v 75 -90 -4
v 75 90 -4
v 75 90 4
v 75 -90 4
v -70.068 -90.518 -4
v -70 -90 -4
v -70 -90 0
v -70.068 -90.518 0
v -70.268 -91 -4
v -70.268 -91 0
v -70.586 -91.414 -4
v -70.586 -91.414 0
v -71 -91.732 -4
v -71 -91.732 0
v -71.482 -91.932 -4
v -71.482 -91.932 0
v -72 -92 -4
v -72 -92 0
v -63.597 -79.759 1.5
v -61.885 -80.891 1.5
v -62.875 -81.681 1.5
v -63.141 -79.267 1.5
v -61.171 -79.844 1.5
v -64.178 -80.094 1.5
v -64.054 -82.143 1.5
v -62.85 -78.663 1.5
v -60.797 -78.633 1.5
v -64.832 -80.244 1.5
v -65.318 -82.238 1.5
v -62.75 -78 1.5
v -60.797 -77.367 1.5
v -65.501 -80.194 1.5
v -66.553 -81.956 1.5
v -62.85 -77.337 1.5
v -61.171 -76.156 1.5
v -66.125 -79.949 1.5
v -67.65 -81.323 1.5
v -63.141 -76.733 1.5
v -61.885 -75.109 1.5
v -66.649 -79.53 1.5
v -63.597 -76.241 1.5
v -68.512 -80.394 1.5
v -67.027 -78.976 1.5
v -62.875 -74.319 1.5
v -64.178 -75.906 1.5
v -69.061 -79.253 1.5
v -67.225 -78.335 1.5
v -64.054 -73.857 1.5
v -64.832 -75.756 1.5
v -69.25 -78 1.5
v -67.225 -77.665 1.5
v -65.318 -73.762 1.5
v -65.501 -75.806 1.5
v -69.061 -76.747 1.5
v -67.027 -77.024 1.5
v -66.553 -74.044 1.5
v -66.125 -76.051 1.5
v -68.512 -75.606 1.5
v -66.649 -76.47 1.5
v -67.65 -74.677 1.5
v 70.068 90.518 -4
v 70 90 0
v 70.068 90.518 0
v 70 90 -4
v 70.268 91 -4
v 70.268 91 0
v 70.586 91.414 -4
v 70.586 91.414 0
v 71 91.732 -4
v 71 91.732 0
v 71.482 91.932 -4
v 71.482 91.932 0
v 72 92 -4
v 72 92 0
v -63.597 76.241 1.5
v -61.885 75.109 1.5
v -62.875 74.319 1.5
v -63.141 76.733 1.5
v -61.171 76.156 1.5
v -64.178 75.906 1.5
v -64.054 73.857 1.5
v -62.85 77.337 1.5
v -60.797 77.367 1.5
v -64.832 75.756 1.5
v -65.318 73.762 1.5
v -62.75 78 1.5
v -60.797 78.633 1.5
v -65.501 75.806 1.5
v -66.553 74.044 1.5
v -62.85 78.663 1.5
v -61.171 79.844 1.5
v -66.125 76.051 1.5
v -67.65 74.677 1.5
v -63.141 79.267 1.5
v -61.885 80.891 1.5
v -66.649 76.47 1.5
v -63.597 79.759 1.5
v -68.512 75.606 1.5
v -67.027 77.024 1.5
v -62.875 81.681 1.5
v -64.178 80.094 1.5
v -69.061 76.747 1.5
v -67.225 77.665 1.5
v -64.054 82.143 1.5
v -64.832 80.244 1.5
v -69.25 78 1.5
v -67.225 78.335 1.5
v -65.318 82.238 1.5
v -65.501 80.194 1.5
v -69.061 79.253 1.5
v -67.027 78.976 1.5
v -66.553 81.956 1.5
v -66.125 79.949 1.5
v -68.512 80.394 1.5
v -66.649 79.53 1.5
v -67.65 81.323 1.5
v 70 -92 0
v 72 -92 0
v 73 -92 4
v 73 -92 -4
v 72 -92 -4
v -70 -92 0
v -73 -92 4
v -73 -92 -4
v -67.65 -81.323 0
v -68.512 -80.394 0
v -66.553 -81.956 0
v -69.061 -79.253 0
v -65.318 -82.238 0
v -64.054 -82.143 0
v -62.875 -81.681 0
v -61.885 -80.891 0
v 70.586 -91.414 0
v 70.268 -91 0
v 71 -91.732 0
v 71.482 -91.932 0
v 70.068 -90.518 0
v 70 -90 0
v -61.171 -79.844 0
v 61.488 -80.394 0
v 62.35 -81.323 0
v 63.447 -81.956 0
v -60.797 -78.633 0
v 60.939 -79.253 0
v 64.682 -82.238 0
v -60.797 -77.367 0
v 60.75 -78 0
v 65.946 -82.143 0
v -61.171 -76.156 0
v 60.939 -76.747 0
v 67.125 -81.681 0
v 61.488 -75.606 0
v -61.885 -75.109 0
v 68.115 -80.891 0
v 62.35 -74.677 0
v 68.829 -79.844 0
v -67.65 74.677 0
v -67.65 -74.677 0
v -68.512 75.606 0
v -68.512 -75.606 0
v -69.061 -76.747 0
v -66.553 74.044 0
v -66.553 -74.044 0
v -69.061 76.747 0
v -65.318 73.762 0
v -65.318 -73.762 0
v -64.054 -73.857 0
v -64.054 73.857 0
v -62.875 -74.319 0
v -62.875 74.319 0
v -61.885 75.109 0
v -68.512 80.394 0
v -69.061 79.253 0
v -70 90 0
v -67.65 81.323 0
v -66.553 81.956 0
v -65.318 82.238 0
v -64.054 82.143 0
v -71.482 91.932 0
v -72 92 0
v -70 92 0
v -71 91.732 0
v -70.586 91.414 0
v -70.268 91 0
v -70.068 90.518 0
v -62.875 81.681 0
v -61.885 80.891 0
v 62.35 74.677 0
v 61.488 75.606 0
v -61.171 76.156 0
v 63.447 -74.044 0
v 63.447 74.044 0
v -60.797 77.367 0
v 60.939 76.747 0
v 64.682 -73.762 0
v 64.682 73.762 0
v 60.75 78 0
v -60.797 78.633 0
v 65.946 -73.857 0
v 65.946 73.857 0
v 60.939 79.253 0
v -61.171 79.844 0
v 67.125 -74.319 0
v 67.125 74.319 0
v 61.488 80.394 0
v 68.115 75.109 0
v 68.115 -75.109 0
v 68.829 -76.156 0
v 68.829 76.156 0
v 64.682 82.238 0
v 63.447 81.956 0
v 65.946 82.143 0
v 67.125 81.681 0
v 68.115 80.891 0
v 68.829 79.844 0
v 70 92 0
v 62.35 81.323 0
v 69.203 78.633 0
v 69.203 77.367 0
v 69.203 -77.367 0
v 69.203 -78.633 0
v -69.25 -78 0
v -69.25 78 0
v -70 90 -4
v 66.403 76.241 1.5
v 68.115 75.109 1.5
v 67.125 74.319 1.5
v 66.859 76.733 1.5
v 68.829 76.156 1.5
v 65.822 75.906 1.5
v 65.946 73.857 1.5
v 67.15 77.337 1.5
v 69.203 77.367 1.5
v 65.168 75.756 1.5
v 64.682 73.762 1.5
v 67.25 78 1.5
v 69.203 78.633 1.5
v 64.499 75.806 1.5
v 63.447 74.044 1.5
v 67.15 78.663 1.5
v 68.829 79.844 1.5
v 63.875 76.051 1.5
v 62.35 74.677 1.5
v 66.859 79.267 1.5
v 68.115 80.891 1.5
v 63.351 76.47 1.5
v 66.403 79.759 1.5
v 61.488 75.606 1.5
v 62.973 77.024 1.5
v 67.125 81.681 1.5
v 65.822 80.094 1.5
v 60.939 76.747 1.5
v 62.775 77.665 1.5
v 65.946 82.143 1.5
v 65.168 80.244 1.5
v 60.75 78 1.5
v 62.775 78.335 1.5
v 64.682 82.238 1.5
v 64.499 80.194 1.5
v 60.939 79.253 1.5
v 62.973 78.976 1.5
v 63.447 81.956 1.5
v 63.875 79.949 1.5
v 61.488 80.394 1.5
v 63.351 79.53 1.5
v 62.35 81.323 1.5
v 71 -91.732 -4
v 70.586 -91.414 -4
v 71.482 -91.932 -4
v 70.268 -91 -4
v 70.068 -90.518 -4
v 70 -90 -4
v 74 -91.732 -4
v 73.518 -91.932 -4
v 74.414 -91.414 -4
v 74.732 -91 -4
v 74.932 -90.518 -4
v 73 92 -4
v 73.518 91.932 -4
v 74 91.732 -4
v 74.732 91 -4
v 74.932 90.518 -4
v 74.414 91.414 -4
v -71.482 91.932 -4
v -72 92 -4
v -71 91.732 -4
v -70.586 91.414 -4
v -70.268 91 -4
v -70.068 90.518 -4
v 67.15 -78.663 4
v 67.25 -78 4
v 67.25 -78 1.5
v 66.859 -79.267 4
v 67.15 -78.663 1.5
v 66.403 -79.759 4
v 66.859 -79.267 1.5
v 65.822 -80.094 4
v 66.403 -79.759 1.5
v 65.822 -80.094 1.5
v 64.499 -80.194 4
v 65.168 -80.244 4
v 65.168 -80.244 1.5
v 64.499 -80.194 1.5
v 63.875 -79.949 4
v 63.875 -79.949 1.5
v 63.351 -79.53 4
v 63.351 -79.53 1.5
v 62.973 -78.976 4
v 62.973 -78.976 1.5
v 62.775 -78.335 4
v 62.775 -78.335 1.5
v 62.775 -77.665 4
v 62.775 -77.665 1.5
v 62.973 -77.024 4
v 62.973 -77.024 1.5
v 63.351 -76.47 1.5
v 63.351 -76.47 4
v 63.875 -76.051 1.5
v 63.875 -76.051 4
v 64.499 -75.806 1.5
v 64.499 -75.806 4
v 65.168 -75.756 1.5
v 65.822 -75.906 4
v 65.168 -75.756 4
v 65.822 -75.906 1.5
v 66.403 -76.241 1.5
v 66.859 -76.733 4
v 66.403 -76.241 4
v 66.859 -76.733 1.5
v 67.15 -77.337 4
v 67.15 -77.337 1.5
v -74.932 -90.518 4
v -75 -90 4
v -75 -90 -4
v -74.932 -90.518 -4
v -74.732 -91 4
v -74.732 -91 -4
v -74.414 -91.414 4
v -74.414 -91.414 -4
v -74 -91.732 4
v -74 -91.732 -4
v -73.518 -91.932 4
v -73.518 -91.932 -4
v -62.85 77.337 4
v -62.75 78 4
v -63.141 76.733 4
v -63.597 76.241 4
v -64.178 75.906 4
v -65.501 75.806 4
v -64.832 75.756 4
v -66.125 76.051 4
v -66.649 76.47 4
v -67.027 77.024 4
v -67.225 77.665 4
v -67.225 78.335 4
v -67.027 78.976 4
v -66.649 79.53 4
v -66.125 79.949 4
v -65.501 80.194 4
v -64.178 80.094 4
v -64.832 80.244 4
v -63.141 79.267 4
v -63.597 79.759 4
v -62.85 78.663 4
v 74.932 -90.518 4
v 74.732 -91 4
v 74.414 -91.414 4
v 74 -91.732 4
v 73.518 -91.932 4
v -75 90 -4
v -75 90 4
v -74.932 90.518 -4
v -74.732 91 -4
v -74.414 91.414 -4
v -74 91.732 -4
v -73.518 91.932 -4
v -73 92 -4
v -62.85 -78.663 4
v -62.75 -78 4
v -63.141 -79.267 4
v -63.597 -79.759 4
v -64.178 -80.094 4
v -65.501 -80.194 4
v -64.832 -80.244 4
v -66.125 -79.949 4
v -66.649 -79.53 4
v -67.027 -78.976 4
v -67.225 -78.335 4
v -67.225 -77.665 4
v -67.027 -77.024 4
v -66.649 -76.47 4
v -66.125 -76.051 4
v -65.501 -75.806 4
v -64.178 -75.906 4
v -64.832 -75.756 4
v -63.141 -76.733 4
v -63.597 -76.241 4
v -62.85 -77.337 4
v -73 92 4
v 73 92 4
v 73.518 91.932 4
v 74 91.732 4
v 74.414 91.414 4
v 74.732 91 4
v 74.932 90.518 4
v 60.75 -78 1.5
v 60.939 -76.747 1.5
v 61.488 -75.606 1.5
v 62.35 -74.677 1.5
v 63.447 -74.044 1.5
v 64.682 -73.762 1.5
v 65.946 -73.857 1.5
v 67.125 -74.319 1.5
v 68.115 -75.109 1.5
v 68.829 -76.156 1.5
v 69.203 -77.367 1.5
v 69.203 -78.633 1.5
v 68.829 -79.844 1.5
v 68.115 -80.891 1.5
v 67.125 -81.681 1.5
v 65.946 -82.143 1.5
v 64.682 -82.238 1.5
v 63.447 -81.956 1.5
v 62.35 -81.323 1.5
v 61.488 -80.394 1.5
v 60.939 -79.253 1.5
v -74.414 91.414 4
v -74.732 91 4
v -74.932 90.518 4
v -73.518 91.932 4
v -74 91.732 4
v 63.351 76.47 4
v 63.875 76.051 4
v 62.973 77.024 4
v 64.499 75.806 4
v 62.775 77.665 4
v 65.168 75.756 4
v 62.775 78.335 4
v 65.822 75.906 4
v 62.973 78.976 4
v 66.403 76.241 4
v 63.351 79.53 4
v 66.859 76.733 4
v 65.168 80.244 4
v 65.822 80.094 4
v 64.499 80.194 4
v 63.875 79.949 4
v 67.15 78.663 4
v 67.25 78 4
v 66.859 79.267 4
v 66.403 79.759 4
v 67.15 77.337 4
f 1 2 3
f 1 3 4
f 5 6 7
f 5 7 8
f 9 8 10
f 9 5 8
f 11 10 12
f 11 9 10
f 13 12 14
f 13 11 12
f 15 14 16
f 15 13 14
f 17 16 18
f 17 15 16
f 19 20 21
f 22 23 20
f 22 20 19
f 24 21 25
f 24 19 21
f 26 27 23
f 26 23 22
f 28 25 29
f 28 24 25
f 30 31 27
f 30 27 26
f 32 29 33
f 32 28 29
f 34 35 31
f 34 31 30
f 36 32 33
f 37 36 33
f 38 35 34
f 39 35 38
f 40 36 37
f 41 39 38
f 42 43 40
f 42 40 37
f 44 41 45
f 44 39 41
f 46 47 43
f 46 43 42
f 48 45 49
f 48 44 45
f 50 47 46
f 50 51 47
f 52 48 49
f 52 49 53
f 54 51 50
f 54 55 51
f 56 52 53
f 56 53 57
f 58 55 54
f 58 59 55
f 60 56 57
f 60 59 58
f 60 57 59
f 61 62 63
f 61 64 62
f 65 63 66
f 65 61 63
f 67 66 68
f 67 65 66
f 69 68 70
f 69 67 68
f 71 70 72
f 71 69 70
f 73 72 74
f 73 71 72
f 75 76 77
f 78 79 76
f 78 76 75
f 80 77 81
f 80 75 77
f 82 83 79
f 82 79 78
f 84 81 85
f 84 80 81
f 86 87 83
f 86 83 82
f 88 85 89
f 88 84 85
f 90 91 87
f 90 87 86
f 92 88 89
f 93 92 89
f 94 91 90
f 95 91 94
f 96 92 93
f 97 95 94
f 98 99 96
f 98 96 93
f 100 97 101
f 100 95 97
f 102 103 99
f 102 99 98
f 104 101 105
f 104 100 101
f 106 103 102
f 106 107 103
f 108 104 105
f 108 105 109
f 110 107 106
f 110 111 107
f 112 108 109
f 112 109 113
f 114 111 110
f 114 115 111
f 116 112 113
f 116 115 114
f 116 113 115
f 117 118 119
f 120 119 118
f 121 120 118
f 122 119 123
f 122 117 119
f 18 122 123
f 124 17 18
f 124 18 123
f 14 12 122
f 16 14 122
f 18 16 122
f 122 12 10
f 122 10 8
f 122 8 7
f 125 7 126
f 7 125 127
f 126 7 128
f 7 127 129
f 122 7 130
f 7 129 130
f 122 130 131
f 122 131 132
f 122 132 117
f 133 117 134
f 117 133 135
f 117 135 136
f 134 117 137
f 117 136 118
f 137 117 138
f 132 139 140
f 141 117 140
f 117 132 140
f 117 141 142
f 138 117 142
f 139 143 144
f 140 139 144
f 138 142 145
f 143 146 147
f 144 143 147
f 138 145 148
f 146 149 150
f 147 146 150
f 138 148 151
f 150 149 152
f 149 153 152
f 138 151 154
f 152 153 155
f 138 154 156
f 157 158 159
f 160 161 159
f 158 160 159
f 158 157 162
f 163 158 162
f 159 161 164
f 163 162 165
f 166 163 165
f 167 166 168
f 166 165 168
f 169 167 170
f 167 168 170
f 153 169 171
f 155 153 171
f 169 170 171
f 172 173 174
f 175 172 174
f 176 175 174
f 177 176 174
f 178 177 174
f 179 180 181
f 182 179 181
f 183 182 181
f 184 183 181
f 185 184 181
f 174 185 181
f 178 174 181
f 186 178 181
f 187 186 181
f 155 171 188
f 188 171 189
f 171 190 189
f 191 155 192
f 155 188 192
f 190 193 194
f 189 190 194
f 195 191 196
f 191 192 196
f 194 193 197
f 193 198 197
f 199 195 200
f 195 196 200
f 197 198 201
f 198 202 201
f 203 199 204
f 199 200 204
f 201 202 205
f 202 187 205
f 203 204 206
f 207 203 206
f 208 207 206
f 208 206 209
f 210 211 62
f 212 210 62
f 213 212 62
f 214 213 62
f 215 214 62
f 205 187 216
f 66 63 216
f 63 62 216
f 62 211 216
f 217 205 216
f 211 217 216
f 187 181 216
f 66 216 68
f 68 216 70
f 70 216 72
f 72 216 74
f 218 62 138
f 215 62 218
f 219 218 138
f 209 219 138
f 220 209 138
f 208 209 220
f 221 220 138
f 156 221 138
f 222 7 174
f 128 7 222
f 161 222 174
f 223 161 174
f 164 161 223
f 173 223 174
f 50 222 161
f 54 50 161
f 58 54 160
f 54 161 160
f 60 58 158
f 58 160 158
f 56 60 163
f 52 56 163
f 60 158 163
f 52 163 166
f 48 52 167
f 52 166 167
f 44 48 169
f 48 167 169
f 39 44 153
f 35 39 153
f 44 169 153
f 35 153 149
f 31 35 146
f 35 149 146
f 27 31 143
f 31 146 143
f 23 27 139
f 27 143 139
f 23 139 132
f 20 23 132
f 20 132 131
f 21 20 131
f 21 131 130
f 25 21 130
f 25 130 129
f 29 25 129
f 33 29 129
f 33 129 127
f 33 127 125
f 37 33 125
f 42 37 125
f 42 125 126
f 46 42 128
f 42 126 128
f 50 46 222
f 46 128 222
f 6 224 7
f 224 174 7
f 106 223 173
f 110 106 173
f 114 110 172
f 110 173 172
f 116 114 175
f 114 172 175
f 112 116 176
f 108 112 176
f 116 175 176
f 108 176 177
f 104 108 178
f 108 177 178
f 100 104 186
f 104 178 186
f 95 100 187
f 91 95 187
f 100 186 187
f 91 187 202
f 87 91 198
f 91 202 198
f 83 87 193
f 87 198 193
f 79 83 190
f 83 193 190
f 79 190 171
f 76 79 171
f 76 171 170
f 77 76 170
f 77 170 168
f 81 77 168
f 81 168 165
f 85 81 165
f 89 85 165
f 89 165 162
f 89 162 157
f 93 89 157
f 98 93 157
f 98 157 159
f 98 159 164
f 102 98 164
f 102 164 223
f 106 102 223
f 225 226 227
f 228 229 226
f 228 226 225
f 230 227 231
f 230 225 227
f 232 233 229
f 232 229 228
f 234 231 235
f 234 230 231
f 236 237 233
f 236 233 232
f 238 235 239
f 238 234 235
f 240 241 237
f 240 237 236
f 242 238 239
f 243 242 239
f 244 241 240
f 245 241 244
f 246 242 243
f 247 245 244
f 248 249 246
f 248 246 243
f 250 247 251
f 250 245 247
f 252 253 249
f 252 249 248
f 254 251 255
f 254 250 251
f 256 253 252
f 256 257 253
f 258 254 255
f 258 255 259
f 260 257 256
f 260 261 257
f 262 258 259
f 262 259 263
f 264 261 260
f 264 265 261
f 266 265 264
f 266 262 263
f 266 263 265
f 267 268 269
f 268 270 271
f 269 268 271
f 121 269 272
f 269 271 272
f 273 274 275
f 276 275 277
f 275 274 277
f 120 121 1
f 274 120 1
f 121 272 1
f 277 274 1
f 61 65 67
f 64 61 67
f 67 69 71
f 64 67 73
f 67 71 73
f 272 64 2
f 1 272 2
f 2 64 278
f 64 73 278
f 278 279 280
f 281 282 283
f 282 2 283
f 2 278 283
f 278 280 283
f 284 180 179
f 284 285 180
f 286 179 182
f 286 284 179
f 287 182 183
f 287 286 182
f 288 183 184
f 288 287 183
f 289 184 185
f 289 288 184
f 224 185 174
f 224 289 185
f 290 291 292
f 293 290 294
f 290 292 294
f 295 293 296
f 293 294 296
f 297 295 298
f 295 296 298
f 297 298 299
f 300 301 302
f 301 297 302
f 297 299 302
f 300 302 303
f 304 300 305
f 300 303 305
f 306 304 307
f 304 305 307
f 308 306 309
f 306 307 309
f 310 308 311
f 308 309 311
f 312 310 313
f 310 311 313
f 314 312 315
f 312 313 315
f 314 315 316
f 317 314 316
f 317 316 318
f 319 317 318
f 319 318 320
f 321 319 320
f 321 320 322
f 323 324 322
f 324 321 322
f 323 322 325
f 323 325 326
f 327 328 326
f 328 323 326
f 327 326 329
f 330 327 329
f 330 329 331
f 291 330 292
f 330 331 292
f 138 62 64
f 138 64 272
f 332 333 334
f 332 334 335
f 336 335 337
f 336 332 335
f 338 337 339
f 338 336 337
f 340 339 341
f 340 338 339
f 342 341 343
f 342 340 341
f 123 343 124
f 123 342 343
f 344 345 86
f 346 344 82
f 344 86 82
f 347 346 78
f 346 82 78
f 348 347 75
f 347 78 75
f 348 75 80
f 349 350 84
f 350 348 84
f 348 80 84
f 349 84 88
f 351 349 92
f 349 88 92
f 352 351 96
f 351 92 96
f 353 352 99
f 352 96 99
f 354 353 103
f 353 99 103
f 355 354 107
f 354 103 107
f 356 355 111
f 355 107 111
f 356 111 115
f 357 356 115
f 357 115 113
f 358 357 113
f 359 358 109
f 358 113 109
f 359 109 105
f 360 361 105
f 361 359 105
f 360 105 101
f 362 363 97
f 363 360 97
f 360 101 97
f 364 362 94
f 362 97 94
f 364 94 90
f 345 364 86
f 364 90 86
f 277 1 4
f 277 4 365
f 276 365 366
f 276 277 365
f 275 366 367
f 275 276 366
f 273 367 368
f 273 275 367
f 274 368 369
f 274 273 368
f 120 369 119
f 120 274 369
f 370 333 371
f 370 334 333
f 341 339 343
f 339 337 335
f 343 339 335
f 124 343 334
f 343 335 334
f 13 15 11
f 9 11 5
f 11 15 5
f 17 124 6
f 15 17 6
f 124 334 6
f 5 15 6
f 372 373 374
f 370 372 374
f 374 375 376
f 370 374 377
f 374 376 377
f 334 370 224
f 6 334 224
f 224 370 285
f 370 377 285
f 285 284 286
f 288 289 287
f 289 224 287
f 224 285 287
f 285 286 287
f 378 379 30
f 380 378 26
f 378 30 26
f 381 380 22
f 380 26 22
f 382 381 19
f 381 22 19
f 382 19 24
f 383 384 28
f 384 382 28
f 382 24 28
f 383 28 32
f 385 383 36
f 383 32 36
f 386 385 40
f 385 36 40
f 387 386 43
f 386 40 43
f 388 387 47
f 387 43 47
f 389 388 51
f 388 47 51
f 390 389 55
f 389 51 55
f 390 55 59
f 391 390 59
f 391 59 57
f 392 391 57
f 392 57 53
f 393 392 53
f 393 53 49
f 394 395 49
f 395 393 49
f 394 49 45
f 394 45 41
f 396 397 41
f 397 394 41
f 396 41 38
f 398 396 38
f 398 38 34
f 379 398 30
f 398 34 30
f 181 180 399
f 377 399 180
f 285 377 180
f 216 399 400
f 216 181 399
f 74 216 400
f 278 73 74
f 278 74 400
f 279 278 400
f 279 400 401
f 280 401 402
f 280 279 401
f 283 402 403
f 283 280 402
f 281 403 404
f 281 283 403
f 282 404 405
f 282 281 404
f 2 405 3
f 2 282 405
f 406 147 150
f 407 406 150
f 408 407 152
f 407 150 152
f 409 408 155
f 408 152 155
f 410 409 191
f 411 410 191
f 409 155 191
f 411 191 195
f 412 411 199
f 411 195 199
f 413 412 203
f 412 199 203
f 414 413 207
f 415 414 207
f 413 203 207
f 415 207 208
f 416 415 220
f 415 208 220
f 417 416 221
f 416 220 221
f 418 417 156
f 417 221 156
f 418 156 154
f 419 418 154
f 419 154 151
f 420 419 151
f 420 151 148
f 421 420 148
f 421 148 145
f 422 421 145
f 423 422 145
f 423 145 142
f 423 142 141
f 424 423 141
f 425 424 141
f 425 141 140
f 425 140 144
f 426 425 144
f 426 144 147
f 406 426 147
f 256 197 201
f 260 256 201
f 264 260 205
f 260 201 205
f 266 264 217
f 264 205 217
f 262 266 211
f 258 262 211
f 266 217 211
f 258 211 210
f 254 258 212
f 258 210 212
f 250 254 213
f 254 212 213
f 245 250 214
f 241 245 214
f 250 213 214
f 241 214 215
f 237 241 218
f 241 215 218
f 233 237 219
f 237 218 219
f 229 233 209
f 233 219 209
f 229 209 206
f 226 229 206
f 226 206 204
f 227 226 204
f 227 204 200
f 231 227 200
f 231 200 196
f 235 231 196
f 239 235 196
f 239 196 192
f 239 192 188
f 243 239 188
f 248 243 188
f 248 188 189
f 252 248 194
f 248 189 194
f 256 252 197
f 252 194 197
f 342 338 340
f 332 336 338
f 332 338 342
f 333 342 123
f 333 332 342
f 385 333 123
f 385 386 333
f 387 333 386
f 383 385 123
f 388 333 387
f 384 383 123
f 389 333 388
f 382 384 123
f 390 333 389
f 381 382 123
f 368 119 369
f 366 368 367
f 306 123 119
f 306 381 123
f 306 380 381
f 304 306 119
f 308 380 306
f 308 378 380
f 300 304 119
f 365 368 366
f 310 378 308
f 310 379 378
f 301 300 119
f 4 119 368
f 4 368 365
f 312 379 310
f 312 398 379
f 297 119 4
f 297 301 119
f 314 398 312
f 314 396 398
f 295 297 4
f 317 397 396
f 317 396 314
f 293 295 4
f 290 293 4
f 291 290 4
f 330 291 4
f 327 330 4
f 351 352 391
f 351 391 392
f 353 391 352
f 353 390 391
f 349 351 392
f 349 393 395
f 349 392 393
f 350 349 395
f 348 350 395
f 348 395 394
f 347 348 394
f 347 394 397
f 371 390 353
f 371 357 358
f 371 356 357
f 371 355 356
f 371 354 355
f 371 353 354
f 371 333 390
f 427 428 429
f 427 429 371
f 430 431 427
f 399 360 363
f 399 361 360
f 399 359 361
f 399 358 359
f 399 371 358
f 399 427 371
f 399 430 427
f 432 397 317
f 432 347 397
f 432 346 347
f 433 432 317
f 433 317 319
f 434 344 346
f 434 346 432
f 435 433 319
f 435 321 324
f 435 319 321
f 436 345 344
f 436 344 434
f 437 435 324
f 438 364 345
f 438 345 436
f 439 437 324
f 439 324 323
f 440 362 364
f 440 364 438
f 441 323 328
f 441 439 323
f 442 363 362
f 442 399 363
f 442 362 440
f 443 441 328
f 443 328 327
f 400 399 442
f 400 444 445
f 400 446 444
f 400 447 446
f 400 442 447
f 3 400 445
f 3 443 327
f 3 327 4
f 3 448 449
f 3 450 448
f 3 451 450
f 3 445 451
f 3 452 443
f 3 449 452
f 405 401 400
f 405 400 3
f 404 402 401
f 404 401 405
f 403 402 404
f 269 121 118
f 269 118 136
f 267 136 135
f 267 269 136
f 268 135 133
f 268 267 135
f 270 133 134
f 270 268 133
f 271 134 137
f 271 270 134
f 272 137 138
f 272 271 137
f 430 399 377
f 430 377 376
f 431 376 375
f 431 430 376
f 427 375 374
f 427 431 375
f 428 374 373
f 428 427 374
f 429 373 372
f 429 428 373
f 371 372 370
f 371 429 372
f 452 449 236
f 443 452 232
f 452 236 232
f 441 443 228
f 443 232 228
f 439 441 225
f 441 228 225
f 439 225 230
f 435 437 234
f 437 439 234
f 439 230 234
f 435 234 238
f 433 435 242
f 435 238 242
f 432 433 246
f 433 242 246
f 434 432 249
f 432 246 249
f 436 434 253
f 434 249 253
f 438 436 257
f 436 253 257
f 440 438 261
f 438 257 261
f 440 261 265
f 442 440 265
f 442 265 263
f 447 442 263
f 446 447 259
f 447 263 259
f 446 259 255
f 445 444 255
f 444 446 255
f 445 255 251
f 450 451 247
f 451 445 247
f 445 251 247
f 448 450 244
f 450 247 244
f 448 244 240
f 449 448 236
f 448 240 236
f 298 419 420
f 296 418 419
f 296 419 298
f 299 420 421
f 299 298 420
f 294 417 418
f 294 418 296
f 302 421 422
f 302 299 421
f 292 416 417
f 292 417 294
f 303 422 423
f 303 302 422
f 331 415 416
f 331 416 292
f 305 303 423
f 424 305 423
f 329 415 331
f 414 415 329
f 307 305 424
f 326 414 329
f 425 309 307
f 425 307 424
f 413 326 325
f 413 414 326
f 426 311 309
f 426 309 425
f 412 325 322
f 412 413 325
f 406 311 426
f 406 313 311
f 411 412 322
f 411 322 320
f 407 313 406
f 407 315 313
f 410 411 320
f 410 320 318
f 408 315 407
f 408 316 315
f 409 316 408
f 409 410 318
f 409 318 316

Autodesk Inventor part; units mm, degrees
ref_plane "YZ Plane" through (0, 0, 0) normal (1, 0, 0) x (0, 1, 0)
ref_plane "XZ Plane" through (0, 0, 0) normal (0, 1, 0) x (-1, 0, 0)
ref_plane "XY Plane" through (0, 0, 0) normal (0, 0, 1) x (1, 0, 0)
sketch "スケッチ1" plane through (0, 0, 0) normal (0, 0, 1) x (1, 0, 0)
  line L0 (-75, 92) -> (75, 92)
  line L1 (75, 92) -> (75, -92)
  line L2 (75, -92) -> (-75, -92)
  line L3 (-75, -92) -> (-75, 92)
  line L4 (65, 92) -> (65, -92) construction
  line L5 (-65, 92) -> (-65, -92) construction
  line L6 (-65, 0) -> (65, 0) construction
  circle A0 centre (-65, 78) radius 2.25
  circle A1 centre (65, 78) radius 2.25
  circle A2 centre (-65, -78) radius 2.25
  circle A3 centre (65, -78) radius 2.25
  point P0 (0, 0)
  point P1 (0, 92)
  point P2 (-75, 0)
  point P3 (0, 0)
  dimension "d0" = 184
  dimension "d1" = 150
  dimension "d2" = 130
  dimension "d3" = 78
  dimension "d4" = 78
  dimension "d5" = 4.5
extrude "押し出し1" add sketch "スケッチ1" along normal blind 4
sketch "スケッチ3" plane through (0, 0, 0) normal (0, 0, 1) x (1, 0, 0)
  line L0 (-75, -92) -> (75, -92) construction
  line L1 (-75, 92) -> (-75, -92) construction
  line L2 (75, 92) -> (-75, 92) construction
  line L3 (75, -92) -> (75, 92) construction
  circle A0 centre (65, -78) radius 2.25 construction
  circle A1 centre (-65, -78) radius 2.25 construction
  circle A2 centre (65, 78) radius 2.25 construction
  circle A3 centre (-65, 78) radius 2.25 construction
  line L4 (75, 92) -> (-75, 92) projected
  line L5 (-75, -92) -> (75, -92) projected
  line L6 (-75, 92) -> (-70, 92)
  line L7 (-70, 92) -> (-70, -92)
  line L8 (-70, -92) -> (-75, -92)
  line L9 (-75, -92) -> (-75, 92)
  line L10 (75, -92) -> (75, 92) projected
  line L11 (75, 92) -> (70, 92)
  line L12 (70, 92) -> (70, -92)
  line L13 (70, -92) -> (75, -92)
  line L14 (75, -92) -> (75, 92)
  point P0 (0, 0)
  point P1 (70, 92)
  point P2 (70, -92)
  dimension "d8" = 5
extrude "押し出し2" add sketch "スケッチ3" against normal blind 4 contours L10 L5 L12 L4 | L7 L5 L9 L4
sketch "スケッチ4" plane through (0, 0, 0) normal (0, 0, -1) x (-1, 0, 0)
  circle A0 centre (65, 78) radius 2.25 construction
  circle A1 centre (-65, 78) radius 2.25 construction
  circle A2 centre (-65, -78) radius 2.25 construction
  circle A3 centre (65, -78) radius 2.25 construction
  circle A4 centre (65, 78) radius 2.25 projected
  circle A5 centre (65, 78) radius 4.25
  circle A6 centre (65, -78) radius 2.25 projected
  circle A7 centre (65, -78) radius 4.25
  circle A8 centre (-65, 78) radius 2.25 projected
  circle A9 centre (-65, 78) radius 4.25
  circle A10 centre (-65, -78) radius 2.25 projected
  circle A11 centre (-65, -78) radius 4.25
  point P0 (0, 0)
  point P1 (63.9692, 92)
  point P2 (66.0308, 92)
  point P3 (-66.0308, 92)
  point P4 (-63.9692, 92)
  point P5 (-63.9692, -92)
  point P6 (-66.0308, -92)
  point P7 (66.0308, -92)
  point P8 (63.9692, -92)
  dimension "d12" = 8.5
extrude "押し出し3" cut sketch "スケッチ4" against normal blind 1.5 contours A4 | A5 | A6 | A7 | A8 | A9 | A10 | A11
fillet "フィレット1" radius 2 8 edges at (-70, 92, -2) (-75, 92, 0) (70, 92, -2) (75, 92, 0) (75, -92, 0) (70, -92, -2) (-70, -92, -2) (-75, -92, 0)
equation "\"d4\" = d3"
properties part number "bottom_140mm_3"
